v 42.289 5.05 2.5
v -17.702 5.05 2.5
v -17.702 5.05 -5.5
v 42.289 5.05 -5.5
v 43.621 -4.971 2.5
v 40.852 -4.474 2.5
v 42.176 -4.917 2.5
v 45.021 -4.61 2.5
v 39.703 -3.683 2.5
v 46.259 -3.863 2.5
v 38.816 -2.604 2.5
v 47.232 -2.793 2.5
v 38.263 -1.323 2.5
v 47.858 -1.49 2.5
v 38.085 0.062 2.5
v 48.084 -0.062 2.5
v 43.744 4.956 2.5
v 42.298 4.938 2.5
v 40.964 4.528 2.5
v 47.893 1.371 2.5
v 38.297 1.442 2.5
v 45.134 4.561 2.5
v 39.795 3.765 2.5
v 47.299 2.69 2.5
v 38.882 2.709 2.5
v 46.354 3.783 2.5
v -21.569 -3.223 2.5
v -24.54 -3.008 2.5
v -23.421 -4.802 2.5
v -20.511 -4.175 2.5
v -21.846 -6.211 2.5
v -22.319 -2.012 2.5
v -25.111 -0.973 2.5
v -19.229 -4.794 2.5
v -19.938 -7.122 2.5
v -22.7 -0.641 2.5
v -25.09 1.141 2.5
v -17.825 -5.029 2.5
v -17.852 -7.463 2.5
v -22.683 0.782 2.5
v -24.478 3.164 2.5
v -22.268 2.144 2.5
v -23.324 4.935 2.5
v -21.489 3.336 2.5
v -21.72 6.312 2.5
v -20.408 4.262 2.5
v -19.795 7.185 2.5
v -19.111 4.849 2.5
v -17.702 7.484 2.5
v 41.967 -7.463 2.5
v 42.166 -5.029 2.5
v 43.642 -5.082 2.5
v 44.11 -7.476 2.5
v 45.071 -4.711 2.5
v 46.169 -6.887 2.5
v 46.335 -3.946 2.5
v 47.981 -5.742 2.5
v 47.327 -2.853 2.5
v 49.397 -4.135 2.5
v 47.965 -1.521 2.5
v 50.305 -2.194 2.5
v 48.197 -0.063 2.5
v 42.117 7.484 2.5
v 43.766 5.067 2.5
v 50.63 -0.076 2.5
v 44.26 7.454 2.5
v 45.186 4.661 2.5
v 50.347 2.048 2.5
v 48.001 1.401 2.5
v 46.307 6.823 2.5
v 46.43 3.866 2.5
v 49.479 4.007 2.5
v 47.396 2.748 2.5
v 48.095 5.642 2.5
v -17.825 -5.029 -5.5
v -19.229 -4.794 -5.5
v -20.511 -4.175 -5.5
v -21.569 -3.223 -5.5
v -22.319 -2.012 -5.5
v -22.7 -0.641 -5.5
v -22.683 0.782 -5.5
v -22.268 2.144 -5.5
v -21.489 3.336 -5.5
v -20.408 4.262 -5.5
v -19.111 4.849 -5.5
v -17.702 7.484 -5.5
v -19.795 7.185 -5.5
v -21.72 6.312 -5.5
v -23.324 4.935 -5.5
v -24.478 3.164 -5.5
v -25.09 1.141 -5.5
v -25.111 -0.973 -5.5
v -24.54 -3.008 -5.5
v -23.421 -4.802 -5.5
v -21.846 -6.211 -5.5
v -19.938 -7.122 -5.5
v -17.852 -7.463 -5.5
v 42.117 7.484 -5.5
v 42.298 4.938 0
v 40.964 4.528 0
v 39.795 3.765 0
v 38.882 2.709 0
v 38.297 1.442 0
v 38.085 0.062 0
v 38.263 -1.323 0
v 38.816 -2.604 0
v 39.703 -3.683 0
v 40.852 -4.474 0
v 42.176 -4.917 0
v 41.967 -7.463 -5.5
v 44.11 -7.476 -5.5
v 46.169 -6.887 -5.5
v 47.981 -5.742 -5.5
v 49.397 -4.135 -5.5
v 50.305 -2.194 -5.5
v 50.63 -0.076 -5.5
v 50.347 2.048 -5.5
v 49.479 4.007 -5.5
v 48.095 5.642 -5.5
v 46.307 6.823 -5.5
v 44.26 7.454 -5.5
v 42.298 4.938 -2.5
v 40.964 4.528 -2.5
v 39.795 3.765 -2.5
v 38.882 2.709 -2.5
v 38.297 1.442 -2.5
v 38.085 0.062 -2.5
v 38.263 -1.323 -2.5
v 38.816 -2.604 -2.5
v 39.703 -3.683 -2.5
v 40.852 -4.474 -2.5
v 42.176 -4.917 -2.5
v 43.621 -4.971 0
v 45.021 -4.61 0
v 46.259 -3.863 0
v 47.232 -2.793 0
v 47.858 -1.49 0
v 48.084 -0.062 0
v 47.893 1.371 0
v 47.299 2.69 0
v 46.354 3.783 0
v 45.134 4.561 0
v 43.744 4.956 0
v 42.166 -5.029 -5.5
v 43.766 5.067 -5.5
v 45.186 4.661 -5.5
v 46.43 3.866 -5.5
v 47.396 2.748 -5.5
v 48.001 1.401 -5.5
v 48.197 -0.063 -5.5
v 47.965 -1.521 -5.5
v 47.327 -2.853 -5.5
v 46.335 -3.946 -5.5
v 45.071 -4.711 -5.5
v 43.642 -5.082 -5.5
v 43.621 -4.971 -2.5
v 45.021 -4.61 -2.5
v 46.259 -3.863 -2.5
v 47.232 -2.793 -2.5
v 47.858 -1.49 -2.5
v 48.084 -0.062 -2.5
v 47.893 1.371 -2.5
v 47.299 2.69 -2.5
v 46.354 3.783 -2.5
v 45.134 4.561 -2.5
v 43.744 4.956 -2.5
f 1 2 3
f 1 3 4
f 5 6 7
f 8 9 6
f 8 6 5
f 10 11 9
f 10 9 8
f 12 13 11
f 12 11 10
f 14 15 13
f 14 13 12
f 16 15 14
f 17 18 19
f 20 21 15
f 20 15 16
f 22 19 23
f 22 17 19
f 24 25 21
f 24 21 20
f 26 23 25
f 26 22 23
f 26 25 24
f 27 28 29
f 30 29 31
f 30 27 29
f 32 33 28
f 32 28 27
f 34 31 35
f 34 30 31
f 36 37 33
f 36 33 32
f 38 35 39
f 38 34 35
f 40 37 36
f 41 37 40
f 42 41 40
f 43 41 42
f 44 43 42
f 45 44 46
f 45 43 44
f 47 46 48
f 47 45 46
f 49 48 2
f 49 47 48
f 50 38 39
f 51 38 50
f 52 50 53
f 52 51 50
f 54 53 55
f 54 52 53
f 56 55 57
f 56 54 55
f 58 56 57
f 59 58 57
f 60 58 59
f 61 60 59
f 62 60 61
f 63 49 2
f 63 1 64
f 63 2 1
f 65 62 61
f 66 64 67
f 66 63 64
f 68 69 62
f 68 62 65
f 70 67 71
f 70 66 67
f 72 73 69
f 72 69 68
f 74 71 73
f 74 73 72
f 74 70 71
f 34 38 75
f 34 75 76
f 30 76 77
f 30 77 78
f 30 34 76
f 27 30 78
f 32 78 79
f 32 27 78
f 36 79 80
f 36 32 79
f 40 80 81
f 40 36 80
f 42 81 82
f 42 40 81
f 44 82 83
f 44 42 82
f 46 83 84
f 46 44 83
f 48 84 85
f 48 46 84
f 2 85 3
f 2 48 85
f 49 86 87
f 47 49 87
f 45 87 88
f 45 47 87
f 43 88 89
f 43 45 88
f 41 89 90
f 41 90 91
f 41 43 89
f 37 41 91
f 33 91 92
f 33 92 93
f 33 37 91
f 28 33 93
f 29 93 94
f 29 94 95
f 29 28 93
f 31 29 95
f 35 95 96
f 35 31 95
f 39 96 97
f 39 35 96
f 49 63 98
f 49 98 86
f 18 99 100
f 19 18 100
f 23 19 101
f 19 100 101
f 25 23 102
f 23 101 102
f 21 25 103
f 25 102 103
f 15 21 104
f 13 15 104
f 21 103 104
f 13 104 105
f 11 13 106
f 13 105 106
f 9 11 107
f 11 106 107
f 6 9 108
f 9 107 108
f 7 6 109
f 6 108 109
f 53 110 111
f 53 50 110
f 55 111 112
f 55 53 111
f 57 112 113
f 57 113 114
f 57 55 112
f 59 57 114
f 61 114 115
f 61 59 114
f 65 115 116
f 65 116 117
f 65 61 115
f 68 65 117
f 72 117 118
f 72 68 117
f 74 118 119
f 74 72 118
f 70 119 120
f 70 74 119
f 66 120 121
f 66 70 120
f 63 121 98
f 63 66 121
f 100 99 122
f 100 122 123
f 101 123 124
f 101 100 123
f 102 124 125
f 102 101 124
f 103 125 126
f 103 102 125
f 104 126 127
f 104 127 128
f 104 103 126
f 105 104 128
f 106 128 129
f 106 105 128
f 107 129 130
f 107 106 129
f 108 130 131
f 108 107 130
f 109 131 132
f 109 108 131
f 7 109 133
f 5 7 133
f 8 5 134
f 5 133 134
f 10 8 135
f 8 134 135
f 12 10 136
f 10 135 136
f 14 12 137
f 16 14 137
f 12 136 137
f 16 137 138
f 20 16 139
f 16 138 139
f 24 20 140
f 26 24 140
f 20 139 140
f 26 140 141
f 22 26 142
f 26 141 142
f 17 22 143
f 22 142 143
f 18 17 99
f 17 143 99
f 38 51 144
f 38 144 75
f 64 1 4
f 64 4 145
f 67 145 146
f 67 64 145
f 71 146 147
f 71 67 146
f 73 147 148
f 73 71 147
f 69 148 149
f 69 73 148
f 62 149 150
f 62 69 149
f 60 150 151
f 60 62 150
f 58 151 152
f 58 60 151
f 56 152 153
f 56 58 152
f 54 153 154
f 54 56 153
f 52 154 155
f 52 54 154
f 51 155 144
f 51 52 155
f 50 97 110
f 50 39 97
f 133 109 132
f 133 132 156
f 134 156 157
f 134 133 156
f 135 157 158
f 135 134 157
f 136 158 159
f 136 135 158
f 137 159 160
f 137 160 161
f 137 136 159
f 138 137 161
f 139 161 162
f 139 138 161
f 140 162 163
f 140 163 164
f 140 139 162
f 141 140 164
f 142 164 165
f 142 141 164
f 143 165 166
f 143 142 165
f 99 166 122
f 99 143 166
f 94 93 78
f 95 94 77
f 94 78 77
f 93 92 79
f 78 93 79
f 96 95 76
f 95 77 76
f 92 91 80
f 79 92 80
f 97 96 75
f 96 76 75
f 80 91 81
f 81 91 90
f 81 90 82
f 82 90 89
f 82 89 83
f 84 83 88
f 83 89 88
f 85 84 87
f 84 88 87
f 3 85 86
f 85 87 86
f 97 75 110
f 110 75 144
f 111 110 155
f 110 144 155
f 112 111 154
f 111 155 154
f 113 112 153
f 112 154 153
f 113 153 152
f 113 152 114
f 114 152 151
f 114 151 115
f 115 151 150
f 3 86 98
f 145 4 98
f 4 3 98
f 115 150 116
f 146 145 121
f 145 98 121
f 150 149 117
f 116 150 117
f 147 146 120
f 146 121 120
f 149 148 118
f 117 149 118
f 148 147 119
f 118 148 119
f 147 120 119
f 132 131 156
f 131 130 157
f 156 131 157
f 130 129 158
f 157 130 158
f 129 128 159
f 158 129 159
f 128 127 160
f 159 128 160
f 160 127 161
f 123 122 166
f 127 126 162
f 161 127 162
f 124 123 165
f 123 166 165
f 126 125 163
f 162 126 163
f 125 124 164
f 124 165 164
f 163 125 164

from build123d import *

# Parameters (mm, degrees)
F1_DEPTH = 2.5
F2_DEPTH = 3


with BuildPart() as f1:
    # F0 (on Top) → F1 (new body, symmetric)
    with BuildSketch(Plane.XY):
        with BuildLine():
            ThreePointArc((41.9669720974, -7.4628552812), (50.6303321073, -0.0758673382), (42.1172516139, 7.483819034))
            Line((42.1172516139, 7.483819034), (-17.7019845665, 7.483819034))
            ThreePointArc((-17.7019845665, 7.483819034), (-25.1756985231, 0.084778927), (-17.8520783344, -7.4628552812))
            Line((-17.8520783344, -7.4628552812), (41.9669720974, -7.4628552812))
        make_face()
        with BuildLine():
            Line((42.1659099961, -5.0290942582), (-17.5787301818, -5.0290942582))
            Line((-17.5787301818, -5.0290942582), (-17.8252389511, -5.0290942582))
            ThreePointArc((-17.8252389511, -5.0290942582), (-22.7419374955, 0.0713600592), (-17.7019845665, 5.050058011))
            Line((-17.7019845665, 5.050058011), (42.2891743421, 5.050058011))
            ThreePointArc((42.2891743421, 5.050058011), (48.1965702074, -0.0625171535), (42.1659099961, -5.0290942582))
        make_face(mode=Mode.SUBTRACT)
    extrude(amount=F1_DEPTH, both=True)

    # F2 (add, symmetric): a face of the model
    f2_faces = [f1.faces().sort_by_distance(p)[0] for p in [
        (49.8574259802, -0.0680962477, -2.5),
    ]]
    extrude(f2_faces, amount=F2_DEPTH, both=True)


with BuildPart() as f1b:
    # F0 (on Top) → F1, piece 2 (new body, symmetric)
    with BuildSketch(Plane.XY):
        with BuildLine():
            ThreePointArc((42.2980154335, 4.9377359991), (38.0850127901, 0.0618314869), (42.1761423349, -4.9167722464))
            ThreePointArc((42.1761423349, -4.9167722464), (48.0842481343, -0.0618314869), (42.2980154335, 4.9377359991))
        make_face()
    extrude(amount=F1_DEPTH, both=True)


solid = Compound([f1.part, f1b.part])
